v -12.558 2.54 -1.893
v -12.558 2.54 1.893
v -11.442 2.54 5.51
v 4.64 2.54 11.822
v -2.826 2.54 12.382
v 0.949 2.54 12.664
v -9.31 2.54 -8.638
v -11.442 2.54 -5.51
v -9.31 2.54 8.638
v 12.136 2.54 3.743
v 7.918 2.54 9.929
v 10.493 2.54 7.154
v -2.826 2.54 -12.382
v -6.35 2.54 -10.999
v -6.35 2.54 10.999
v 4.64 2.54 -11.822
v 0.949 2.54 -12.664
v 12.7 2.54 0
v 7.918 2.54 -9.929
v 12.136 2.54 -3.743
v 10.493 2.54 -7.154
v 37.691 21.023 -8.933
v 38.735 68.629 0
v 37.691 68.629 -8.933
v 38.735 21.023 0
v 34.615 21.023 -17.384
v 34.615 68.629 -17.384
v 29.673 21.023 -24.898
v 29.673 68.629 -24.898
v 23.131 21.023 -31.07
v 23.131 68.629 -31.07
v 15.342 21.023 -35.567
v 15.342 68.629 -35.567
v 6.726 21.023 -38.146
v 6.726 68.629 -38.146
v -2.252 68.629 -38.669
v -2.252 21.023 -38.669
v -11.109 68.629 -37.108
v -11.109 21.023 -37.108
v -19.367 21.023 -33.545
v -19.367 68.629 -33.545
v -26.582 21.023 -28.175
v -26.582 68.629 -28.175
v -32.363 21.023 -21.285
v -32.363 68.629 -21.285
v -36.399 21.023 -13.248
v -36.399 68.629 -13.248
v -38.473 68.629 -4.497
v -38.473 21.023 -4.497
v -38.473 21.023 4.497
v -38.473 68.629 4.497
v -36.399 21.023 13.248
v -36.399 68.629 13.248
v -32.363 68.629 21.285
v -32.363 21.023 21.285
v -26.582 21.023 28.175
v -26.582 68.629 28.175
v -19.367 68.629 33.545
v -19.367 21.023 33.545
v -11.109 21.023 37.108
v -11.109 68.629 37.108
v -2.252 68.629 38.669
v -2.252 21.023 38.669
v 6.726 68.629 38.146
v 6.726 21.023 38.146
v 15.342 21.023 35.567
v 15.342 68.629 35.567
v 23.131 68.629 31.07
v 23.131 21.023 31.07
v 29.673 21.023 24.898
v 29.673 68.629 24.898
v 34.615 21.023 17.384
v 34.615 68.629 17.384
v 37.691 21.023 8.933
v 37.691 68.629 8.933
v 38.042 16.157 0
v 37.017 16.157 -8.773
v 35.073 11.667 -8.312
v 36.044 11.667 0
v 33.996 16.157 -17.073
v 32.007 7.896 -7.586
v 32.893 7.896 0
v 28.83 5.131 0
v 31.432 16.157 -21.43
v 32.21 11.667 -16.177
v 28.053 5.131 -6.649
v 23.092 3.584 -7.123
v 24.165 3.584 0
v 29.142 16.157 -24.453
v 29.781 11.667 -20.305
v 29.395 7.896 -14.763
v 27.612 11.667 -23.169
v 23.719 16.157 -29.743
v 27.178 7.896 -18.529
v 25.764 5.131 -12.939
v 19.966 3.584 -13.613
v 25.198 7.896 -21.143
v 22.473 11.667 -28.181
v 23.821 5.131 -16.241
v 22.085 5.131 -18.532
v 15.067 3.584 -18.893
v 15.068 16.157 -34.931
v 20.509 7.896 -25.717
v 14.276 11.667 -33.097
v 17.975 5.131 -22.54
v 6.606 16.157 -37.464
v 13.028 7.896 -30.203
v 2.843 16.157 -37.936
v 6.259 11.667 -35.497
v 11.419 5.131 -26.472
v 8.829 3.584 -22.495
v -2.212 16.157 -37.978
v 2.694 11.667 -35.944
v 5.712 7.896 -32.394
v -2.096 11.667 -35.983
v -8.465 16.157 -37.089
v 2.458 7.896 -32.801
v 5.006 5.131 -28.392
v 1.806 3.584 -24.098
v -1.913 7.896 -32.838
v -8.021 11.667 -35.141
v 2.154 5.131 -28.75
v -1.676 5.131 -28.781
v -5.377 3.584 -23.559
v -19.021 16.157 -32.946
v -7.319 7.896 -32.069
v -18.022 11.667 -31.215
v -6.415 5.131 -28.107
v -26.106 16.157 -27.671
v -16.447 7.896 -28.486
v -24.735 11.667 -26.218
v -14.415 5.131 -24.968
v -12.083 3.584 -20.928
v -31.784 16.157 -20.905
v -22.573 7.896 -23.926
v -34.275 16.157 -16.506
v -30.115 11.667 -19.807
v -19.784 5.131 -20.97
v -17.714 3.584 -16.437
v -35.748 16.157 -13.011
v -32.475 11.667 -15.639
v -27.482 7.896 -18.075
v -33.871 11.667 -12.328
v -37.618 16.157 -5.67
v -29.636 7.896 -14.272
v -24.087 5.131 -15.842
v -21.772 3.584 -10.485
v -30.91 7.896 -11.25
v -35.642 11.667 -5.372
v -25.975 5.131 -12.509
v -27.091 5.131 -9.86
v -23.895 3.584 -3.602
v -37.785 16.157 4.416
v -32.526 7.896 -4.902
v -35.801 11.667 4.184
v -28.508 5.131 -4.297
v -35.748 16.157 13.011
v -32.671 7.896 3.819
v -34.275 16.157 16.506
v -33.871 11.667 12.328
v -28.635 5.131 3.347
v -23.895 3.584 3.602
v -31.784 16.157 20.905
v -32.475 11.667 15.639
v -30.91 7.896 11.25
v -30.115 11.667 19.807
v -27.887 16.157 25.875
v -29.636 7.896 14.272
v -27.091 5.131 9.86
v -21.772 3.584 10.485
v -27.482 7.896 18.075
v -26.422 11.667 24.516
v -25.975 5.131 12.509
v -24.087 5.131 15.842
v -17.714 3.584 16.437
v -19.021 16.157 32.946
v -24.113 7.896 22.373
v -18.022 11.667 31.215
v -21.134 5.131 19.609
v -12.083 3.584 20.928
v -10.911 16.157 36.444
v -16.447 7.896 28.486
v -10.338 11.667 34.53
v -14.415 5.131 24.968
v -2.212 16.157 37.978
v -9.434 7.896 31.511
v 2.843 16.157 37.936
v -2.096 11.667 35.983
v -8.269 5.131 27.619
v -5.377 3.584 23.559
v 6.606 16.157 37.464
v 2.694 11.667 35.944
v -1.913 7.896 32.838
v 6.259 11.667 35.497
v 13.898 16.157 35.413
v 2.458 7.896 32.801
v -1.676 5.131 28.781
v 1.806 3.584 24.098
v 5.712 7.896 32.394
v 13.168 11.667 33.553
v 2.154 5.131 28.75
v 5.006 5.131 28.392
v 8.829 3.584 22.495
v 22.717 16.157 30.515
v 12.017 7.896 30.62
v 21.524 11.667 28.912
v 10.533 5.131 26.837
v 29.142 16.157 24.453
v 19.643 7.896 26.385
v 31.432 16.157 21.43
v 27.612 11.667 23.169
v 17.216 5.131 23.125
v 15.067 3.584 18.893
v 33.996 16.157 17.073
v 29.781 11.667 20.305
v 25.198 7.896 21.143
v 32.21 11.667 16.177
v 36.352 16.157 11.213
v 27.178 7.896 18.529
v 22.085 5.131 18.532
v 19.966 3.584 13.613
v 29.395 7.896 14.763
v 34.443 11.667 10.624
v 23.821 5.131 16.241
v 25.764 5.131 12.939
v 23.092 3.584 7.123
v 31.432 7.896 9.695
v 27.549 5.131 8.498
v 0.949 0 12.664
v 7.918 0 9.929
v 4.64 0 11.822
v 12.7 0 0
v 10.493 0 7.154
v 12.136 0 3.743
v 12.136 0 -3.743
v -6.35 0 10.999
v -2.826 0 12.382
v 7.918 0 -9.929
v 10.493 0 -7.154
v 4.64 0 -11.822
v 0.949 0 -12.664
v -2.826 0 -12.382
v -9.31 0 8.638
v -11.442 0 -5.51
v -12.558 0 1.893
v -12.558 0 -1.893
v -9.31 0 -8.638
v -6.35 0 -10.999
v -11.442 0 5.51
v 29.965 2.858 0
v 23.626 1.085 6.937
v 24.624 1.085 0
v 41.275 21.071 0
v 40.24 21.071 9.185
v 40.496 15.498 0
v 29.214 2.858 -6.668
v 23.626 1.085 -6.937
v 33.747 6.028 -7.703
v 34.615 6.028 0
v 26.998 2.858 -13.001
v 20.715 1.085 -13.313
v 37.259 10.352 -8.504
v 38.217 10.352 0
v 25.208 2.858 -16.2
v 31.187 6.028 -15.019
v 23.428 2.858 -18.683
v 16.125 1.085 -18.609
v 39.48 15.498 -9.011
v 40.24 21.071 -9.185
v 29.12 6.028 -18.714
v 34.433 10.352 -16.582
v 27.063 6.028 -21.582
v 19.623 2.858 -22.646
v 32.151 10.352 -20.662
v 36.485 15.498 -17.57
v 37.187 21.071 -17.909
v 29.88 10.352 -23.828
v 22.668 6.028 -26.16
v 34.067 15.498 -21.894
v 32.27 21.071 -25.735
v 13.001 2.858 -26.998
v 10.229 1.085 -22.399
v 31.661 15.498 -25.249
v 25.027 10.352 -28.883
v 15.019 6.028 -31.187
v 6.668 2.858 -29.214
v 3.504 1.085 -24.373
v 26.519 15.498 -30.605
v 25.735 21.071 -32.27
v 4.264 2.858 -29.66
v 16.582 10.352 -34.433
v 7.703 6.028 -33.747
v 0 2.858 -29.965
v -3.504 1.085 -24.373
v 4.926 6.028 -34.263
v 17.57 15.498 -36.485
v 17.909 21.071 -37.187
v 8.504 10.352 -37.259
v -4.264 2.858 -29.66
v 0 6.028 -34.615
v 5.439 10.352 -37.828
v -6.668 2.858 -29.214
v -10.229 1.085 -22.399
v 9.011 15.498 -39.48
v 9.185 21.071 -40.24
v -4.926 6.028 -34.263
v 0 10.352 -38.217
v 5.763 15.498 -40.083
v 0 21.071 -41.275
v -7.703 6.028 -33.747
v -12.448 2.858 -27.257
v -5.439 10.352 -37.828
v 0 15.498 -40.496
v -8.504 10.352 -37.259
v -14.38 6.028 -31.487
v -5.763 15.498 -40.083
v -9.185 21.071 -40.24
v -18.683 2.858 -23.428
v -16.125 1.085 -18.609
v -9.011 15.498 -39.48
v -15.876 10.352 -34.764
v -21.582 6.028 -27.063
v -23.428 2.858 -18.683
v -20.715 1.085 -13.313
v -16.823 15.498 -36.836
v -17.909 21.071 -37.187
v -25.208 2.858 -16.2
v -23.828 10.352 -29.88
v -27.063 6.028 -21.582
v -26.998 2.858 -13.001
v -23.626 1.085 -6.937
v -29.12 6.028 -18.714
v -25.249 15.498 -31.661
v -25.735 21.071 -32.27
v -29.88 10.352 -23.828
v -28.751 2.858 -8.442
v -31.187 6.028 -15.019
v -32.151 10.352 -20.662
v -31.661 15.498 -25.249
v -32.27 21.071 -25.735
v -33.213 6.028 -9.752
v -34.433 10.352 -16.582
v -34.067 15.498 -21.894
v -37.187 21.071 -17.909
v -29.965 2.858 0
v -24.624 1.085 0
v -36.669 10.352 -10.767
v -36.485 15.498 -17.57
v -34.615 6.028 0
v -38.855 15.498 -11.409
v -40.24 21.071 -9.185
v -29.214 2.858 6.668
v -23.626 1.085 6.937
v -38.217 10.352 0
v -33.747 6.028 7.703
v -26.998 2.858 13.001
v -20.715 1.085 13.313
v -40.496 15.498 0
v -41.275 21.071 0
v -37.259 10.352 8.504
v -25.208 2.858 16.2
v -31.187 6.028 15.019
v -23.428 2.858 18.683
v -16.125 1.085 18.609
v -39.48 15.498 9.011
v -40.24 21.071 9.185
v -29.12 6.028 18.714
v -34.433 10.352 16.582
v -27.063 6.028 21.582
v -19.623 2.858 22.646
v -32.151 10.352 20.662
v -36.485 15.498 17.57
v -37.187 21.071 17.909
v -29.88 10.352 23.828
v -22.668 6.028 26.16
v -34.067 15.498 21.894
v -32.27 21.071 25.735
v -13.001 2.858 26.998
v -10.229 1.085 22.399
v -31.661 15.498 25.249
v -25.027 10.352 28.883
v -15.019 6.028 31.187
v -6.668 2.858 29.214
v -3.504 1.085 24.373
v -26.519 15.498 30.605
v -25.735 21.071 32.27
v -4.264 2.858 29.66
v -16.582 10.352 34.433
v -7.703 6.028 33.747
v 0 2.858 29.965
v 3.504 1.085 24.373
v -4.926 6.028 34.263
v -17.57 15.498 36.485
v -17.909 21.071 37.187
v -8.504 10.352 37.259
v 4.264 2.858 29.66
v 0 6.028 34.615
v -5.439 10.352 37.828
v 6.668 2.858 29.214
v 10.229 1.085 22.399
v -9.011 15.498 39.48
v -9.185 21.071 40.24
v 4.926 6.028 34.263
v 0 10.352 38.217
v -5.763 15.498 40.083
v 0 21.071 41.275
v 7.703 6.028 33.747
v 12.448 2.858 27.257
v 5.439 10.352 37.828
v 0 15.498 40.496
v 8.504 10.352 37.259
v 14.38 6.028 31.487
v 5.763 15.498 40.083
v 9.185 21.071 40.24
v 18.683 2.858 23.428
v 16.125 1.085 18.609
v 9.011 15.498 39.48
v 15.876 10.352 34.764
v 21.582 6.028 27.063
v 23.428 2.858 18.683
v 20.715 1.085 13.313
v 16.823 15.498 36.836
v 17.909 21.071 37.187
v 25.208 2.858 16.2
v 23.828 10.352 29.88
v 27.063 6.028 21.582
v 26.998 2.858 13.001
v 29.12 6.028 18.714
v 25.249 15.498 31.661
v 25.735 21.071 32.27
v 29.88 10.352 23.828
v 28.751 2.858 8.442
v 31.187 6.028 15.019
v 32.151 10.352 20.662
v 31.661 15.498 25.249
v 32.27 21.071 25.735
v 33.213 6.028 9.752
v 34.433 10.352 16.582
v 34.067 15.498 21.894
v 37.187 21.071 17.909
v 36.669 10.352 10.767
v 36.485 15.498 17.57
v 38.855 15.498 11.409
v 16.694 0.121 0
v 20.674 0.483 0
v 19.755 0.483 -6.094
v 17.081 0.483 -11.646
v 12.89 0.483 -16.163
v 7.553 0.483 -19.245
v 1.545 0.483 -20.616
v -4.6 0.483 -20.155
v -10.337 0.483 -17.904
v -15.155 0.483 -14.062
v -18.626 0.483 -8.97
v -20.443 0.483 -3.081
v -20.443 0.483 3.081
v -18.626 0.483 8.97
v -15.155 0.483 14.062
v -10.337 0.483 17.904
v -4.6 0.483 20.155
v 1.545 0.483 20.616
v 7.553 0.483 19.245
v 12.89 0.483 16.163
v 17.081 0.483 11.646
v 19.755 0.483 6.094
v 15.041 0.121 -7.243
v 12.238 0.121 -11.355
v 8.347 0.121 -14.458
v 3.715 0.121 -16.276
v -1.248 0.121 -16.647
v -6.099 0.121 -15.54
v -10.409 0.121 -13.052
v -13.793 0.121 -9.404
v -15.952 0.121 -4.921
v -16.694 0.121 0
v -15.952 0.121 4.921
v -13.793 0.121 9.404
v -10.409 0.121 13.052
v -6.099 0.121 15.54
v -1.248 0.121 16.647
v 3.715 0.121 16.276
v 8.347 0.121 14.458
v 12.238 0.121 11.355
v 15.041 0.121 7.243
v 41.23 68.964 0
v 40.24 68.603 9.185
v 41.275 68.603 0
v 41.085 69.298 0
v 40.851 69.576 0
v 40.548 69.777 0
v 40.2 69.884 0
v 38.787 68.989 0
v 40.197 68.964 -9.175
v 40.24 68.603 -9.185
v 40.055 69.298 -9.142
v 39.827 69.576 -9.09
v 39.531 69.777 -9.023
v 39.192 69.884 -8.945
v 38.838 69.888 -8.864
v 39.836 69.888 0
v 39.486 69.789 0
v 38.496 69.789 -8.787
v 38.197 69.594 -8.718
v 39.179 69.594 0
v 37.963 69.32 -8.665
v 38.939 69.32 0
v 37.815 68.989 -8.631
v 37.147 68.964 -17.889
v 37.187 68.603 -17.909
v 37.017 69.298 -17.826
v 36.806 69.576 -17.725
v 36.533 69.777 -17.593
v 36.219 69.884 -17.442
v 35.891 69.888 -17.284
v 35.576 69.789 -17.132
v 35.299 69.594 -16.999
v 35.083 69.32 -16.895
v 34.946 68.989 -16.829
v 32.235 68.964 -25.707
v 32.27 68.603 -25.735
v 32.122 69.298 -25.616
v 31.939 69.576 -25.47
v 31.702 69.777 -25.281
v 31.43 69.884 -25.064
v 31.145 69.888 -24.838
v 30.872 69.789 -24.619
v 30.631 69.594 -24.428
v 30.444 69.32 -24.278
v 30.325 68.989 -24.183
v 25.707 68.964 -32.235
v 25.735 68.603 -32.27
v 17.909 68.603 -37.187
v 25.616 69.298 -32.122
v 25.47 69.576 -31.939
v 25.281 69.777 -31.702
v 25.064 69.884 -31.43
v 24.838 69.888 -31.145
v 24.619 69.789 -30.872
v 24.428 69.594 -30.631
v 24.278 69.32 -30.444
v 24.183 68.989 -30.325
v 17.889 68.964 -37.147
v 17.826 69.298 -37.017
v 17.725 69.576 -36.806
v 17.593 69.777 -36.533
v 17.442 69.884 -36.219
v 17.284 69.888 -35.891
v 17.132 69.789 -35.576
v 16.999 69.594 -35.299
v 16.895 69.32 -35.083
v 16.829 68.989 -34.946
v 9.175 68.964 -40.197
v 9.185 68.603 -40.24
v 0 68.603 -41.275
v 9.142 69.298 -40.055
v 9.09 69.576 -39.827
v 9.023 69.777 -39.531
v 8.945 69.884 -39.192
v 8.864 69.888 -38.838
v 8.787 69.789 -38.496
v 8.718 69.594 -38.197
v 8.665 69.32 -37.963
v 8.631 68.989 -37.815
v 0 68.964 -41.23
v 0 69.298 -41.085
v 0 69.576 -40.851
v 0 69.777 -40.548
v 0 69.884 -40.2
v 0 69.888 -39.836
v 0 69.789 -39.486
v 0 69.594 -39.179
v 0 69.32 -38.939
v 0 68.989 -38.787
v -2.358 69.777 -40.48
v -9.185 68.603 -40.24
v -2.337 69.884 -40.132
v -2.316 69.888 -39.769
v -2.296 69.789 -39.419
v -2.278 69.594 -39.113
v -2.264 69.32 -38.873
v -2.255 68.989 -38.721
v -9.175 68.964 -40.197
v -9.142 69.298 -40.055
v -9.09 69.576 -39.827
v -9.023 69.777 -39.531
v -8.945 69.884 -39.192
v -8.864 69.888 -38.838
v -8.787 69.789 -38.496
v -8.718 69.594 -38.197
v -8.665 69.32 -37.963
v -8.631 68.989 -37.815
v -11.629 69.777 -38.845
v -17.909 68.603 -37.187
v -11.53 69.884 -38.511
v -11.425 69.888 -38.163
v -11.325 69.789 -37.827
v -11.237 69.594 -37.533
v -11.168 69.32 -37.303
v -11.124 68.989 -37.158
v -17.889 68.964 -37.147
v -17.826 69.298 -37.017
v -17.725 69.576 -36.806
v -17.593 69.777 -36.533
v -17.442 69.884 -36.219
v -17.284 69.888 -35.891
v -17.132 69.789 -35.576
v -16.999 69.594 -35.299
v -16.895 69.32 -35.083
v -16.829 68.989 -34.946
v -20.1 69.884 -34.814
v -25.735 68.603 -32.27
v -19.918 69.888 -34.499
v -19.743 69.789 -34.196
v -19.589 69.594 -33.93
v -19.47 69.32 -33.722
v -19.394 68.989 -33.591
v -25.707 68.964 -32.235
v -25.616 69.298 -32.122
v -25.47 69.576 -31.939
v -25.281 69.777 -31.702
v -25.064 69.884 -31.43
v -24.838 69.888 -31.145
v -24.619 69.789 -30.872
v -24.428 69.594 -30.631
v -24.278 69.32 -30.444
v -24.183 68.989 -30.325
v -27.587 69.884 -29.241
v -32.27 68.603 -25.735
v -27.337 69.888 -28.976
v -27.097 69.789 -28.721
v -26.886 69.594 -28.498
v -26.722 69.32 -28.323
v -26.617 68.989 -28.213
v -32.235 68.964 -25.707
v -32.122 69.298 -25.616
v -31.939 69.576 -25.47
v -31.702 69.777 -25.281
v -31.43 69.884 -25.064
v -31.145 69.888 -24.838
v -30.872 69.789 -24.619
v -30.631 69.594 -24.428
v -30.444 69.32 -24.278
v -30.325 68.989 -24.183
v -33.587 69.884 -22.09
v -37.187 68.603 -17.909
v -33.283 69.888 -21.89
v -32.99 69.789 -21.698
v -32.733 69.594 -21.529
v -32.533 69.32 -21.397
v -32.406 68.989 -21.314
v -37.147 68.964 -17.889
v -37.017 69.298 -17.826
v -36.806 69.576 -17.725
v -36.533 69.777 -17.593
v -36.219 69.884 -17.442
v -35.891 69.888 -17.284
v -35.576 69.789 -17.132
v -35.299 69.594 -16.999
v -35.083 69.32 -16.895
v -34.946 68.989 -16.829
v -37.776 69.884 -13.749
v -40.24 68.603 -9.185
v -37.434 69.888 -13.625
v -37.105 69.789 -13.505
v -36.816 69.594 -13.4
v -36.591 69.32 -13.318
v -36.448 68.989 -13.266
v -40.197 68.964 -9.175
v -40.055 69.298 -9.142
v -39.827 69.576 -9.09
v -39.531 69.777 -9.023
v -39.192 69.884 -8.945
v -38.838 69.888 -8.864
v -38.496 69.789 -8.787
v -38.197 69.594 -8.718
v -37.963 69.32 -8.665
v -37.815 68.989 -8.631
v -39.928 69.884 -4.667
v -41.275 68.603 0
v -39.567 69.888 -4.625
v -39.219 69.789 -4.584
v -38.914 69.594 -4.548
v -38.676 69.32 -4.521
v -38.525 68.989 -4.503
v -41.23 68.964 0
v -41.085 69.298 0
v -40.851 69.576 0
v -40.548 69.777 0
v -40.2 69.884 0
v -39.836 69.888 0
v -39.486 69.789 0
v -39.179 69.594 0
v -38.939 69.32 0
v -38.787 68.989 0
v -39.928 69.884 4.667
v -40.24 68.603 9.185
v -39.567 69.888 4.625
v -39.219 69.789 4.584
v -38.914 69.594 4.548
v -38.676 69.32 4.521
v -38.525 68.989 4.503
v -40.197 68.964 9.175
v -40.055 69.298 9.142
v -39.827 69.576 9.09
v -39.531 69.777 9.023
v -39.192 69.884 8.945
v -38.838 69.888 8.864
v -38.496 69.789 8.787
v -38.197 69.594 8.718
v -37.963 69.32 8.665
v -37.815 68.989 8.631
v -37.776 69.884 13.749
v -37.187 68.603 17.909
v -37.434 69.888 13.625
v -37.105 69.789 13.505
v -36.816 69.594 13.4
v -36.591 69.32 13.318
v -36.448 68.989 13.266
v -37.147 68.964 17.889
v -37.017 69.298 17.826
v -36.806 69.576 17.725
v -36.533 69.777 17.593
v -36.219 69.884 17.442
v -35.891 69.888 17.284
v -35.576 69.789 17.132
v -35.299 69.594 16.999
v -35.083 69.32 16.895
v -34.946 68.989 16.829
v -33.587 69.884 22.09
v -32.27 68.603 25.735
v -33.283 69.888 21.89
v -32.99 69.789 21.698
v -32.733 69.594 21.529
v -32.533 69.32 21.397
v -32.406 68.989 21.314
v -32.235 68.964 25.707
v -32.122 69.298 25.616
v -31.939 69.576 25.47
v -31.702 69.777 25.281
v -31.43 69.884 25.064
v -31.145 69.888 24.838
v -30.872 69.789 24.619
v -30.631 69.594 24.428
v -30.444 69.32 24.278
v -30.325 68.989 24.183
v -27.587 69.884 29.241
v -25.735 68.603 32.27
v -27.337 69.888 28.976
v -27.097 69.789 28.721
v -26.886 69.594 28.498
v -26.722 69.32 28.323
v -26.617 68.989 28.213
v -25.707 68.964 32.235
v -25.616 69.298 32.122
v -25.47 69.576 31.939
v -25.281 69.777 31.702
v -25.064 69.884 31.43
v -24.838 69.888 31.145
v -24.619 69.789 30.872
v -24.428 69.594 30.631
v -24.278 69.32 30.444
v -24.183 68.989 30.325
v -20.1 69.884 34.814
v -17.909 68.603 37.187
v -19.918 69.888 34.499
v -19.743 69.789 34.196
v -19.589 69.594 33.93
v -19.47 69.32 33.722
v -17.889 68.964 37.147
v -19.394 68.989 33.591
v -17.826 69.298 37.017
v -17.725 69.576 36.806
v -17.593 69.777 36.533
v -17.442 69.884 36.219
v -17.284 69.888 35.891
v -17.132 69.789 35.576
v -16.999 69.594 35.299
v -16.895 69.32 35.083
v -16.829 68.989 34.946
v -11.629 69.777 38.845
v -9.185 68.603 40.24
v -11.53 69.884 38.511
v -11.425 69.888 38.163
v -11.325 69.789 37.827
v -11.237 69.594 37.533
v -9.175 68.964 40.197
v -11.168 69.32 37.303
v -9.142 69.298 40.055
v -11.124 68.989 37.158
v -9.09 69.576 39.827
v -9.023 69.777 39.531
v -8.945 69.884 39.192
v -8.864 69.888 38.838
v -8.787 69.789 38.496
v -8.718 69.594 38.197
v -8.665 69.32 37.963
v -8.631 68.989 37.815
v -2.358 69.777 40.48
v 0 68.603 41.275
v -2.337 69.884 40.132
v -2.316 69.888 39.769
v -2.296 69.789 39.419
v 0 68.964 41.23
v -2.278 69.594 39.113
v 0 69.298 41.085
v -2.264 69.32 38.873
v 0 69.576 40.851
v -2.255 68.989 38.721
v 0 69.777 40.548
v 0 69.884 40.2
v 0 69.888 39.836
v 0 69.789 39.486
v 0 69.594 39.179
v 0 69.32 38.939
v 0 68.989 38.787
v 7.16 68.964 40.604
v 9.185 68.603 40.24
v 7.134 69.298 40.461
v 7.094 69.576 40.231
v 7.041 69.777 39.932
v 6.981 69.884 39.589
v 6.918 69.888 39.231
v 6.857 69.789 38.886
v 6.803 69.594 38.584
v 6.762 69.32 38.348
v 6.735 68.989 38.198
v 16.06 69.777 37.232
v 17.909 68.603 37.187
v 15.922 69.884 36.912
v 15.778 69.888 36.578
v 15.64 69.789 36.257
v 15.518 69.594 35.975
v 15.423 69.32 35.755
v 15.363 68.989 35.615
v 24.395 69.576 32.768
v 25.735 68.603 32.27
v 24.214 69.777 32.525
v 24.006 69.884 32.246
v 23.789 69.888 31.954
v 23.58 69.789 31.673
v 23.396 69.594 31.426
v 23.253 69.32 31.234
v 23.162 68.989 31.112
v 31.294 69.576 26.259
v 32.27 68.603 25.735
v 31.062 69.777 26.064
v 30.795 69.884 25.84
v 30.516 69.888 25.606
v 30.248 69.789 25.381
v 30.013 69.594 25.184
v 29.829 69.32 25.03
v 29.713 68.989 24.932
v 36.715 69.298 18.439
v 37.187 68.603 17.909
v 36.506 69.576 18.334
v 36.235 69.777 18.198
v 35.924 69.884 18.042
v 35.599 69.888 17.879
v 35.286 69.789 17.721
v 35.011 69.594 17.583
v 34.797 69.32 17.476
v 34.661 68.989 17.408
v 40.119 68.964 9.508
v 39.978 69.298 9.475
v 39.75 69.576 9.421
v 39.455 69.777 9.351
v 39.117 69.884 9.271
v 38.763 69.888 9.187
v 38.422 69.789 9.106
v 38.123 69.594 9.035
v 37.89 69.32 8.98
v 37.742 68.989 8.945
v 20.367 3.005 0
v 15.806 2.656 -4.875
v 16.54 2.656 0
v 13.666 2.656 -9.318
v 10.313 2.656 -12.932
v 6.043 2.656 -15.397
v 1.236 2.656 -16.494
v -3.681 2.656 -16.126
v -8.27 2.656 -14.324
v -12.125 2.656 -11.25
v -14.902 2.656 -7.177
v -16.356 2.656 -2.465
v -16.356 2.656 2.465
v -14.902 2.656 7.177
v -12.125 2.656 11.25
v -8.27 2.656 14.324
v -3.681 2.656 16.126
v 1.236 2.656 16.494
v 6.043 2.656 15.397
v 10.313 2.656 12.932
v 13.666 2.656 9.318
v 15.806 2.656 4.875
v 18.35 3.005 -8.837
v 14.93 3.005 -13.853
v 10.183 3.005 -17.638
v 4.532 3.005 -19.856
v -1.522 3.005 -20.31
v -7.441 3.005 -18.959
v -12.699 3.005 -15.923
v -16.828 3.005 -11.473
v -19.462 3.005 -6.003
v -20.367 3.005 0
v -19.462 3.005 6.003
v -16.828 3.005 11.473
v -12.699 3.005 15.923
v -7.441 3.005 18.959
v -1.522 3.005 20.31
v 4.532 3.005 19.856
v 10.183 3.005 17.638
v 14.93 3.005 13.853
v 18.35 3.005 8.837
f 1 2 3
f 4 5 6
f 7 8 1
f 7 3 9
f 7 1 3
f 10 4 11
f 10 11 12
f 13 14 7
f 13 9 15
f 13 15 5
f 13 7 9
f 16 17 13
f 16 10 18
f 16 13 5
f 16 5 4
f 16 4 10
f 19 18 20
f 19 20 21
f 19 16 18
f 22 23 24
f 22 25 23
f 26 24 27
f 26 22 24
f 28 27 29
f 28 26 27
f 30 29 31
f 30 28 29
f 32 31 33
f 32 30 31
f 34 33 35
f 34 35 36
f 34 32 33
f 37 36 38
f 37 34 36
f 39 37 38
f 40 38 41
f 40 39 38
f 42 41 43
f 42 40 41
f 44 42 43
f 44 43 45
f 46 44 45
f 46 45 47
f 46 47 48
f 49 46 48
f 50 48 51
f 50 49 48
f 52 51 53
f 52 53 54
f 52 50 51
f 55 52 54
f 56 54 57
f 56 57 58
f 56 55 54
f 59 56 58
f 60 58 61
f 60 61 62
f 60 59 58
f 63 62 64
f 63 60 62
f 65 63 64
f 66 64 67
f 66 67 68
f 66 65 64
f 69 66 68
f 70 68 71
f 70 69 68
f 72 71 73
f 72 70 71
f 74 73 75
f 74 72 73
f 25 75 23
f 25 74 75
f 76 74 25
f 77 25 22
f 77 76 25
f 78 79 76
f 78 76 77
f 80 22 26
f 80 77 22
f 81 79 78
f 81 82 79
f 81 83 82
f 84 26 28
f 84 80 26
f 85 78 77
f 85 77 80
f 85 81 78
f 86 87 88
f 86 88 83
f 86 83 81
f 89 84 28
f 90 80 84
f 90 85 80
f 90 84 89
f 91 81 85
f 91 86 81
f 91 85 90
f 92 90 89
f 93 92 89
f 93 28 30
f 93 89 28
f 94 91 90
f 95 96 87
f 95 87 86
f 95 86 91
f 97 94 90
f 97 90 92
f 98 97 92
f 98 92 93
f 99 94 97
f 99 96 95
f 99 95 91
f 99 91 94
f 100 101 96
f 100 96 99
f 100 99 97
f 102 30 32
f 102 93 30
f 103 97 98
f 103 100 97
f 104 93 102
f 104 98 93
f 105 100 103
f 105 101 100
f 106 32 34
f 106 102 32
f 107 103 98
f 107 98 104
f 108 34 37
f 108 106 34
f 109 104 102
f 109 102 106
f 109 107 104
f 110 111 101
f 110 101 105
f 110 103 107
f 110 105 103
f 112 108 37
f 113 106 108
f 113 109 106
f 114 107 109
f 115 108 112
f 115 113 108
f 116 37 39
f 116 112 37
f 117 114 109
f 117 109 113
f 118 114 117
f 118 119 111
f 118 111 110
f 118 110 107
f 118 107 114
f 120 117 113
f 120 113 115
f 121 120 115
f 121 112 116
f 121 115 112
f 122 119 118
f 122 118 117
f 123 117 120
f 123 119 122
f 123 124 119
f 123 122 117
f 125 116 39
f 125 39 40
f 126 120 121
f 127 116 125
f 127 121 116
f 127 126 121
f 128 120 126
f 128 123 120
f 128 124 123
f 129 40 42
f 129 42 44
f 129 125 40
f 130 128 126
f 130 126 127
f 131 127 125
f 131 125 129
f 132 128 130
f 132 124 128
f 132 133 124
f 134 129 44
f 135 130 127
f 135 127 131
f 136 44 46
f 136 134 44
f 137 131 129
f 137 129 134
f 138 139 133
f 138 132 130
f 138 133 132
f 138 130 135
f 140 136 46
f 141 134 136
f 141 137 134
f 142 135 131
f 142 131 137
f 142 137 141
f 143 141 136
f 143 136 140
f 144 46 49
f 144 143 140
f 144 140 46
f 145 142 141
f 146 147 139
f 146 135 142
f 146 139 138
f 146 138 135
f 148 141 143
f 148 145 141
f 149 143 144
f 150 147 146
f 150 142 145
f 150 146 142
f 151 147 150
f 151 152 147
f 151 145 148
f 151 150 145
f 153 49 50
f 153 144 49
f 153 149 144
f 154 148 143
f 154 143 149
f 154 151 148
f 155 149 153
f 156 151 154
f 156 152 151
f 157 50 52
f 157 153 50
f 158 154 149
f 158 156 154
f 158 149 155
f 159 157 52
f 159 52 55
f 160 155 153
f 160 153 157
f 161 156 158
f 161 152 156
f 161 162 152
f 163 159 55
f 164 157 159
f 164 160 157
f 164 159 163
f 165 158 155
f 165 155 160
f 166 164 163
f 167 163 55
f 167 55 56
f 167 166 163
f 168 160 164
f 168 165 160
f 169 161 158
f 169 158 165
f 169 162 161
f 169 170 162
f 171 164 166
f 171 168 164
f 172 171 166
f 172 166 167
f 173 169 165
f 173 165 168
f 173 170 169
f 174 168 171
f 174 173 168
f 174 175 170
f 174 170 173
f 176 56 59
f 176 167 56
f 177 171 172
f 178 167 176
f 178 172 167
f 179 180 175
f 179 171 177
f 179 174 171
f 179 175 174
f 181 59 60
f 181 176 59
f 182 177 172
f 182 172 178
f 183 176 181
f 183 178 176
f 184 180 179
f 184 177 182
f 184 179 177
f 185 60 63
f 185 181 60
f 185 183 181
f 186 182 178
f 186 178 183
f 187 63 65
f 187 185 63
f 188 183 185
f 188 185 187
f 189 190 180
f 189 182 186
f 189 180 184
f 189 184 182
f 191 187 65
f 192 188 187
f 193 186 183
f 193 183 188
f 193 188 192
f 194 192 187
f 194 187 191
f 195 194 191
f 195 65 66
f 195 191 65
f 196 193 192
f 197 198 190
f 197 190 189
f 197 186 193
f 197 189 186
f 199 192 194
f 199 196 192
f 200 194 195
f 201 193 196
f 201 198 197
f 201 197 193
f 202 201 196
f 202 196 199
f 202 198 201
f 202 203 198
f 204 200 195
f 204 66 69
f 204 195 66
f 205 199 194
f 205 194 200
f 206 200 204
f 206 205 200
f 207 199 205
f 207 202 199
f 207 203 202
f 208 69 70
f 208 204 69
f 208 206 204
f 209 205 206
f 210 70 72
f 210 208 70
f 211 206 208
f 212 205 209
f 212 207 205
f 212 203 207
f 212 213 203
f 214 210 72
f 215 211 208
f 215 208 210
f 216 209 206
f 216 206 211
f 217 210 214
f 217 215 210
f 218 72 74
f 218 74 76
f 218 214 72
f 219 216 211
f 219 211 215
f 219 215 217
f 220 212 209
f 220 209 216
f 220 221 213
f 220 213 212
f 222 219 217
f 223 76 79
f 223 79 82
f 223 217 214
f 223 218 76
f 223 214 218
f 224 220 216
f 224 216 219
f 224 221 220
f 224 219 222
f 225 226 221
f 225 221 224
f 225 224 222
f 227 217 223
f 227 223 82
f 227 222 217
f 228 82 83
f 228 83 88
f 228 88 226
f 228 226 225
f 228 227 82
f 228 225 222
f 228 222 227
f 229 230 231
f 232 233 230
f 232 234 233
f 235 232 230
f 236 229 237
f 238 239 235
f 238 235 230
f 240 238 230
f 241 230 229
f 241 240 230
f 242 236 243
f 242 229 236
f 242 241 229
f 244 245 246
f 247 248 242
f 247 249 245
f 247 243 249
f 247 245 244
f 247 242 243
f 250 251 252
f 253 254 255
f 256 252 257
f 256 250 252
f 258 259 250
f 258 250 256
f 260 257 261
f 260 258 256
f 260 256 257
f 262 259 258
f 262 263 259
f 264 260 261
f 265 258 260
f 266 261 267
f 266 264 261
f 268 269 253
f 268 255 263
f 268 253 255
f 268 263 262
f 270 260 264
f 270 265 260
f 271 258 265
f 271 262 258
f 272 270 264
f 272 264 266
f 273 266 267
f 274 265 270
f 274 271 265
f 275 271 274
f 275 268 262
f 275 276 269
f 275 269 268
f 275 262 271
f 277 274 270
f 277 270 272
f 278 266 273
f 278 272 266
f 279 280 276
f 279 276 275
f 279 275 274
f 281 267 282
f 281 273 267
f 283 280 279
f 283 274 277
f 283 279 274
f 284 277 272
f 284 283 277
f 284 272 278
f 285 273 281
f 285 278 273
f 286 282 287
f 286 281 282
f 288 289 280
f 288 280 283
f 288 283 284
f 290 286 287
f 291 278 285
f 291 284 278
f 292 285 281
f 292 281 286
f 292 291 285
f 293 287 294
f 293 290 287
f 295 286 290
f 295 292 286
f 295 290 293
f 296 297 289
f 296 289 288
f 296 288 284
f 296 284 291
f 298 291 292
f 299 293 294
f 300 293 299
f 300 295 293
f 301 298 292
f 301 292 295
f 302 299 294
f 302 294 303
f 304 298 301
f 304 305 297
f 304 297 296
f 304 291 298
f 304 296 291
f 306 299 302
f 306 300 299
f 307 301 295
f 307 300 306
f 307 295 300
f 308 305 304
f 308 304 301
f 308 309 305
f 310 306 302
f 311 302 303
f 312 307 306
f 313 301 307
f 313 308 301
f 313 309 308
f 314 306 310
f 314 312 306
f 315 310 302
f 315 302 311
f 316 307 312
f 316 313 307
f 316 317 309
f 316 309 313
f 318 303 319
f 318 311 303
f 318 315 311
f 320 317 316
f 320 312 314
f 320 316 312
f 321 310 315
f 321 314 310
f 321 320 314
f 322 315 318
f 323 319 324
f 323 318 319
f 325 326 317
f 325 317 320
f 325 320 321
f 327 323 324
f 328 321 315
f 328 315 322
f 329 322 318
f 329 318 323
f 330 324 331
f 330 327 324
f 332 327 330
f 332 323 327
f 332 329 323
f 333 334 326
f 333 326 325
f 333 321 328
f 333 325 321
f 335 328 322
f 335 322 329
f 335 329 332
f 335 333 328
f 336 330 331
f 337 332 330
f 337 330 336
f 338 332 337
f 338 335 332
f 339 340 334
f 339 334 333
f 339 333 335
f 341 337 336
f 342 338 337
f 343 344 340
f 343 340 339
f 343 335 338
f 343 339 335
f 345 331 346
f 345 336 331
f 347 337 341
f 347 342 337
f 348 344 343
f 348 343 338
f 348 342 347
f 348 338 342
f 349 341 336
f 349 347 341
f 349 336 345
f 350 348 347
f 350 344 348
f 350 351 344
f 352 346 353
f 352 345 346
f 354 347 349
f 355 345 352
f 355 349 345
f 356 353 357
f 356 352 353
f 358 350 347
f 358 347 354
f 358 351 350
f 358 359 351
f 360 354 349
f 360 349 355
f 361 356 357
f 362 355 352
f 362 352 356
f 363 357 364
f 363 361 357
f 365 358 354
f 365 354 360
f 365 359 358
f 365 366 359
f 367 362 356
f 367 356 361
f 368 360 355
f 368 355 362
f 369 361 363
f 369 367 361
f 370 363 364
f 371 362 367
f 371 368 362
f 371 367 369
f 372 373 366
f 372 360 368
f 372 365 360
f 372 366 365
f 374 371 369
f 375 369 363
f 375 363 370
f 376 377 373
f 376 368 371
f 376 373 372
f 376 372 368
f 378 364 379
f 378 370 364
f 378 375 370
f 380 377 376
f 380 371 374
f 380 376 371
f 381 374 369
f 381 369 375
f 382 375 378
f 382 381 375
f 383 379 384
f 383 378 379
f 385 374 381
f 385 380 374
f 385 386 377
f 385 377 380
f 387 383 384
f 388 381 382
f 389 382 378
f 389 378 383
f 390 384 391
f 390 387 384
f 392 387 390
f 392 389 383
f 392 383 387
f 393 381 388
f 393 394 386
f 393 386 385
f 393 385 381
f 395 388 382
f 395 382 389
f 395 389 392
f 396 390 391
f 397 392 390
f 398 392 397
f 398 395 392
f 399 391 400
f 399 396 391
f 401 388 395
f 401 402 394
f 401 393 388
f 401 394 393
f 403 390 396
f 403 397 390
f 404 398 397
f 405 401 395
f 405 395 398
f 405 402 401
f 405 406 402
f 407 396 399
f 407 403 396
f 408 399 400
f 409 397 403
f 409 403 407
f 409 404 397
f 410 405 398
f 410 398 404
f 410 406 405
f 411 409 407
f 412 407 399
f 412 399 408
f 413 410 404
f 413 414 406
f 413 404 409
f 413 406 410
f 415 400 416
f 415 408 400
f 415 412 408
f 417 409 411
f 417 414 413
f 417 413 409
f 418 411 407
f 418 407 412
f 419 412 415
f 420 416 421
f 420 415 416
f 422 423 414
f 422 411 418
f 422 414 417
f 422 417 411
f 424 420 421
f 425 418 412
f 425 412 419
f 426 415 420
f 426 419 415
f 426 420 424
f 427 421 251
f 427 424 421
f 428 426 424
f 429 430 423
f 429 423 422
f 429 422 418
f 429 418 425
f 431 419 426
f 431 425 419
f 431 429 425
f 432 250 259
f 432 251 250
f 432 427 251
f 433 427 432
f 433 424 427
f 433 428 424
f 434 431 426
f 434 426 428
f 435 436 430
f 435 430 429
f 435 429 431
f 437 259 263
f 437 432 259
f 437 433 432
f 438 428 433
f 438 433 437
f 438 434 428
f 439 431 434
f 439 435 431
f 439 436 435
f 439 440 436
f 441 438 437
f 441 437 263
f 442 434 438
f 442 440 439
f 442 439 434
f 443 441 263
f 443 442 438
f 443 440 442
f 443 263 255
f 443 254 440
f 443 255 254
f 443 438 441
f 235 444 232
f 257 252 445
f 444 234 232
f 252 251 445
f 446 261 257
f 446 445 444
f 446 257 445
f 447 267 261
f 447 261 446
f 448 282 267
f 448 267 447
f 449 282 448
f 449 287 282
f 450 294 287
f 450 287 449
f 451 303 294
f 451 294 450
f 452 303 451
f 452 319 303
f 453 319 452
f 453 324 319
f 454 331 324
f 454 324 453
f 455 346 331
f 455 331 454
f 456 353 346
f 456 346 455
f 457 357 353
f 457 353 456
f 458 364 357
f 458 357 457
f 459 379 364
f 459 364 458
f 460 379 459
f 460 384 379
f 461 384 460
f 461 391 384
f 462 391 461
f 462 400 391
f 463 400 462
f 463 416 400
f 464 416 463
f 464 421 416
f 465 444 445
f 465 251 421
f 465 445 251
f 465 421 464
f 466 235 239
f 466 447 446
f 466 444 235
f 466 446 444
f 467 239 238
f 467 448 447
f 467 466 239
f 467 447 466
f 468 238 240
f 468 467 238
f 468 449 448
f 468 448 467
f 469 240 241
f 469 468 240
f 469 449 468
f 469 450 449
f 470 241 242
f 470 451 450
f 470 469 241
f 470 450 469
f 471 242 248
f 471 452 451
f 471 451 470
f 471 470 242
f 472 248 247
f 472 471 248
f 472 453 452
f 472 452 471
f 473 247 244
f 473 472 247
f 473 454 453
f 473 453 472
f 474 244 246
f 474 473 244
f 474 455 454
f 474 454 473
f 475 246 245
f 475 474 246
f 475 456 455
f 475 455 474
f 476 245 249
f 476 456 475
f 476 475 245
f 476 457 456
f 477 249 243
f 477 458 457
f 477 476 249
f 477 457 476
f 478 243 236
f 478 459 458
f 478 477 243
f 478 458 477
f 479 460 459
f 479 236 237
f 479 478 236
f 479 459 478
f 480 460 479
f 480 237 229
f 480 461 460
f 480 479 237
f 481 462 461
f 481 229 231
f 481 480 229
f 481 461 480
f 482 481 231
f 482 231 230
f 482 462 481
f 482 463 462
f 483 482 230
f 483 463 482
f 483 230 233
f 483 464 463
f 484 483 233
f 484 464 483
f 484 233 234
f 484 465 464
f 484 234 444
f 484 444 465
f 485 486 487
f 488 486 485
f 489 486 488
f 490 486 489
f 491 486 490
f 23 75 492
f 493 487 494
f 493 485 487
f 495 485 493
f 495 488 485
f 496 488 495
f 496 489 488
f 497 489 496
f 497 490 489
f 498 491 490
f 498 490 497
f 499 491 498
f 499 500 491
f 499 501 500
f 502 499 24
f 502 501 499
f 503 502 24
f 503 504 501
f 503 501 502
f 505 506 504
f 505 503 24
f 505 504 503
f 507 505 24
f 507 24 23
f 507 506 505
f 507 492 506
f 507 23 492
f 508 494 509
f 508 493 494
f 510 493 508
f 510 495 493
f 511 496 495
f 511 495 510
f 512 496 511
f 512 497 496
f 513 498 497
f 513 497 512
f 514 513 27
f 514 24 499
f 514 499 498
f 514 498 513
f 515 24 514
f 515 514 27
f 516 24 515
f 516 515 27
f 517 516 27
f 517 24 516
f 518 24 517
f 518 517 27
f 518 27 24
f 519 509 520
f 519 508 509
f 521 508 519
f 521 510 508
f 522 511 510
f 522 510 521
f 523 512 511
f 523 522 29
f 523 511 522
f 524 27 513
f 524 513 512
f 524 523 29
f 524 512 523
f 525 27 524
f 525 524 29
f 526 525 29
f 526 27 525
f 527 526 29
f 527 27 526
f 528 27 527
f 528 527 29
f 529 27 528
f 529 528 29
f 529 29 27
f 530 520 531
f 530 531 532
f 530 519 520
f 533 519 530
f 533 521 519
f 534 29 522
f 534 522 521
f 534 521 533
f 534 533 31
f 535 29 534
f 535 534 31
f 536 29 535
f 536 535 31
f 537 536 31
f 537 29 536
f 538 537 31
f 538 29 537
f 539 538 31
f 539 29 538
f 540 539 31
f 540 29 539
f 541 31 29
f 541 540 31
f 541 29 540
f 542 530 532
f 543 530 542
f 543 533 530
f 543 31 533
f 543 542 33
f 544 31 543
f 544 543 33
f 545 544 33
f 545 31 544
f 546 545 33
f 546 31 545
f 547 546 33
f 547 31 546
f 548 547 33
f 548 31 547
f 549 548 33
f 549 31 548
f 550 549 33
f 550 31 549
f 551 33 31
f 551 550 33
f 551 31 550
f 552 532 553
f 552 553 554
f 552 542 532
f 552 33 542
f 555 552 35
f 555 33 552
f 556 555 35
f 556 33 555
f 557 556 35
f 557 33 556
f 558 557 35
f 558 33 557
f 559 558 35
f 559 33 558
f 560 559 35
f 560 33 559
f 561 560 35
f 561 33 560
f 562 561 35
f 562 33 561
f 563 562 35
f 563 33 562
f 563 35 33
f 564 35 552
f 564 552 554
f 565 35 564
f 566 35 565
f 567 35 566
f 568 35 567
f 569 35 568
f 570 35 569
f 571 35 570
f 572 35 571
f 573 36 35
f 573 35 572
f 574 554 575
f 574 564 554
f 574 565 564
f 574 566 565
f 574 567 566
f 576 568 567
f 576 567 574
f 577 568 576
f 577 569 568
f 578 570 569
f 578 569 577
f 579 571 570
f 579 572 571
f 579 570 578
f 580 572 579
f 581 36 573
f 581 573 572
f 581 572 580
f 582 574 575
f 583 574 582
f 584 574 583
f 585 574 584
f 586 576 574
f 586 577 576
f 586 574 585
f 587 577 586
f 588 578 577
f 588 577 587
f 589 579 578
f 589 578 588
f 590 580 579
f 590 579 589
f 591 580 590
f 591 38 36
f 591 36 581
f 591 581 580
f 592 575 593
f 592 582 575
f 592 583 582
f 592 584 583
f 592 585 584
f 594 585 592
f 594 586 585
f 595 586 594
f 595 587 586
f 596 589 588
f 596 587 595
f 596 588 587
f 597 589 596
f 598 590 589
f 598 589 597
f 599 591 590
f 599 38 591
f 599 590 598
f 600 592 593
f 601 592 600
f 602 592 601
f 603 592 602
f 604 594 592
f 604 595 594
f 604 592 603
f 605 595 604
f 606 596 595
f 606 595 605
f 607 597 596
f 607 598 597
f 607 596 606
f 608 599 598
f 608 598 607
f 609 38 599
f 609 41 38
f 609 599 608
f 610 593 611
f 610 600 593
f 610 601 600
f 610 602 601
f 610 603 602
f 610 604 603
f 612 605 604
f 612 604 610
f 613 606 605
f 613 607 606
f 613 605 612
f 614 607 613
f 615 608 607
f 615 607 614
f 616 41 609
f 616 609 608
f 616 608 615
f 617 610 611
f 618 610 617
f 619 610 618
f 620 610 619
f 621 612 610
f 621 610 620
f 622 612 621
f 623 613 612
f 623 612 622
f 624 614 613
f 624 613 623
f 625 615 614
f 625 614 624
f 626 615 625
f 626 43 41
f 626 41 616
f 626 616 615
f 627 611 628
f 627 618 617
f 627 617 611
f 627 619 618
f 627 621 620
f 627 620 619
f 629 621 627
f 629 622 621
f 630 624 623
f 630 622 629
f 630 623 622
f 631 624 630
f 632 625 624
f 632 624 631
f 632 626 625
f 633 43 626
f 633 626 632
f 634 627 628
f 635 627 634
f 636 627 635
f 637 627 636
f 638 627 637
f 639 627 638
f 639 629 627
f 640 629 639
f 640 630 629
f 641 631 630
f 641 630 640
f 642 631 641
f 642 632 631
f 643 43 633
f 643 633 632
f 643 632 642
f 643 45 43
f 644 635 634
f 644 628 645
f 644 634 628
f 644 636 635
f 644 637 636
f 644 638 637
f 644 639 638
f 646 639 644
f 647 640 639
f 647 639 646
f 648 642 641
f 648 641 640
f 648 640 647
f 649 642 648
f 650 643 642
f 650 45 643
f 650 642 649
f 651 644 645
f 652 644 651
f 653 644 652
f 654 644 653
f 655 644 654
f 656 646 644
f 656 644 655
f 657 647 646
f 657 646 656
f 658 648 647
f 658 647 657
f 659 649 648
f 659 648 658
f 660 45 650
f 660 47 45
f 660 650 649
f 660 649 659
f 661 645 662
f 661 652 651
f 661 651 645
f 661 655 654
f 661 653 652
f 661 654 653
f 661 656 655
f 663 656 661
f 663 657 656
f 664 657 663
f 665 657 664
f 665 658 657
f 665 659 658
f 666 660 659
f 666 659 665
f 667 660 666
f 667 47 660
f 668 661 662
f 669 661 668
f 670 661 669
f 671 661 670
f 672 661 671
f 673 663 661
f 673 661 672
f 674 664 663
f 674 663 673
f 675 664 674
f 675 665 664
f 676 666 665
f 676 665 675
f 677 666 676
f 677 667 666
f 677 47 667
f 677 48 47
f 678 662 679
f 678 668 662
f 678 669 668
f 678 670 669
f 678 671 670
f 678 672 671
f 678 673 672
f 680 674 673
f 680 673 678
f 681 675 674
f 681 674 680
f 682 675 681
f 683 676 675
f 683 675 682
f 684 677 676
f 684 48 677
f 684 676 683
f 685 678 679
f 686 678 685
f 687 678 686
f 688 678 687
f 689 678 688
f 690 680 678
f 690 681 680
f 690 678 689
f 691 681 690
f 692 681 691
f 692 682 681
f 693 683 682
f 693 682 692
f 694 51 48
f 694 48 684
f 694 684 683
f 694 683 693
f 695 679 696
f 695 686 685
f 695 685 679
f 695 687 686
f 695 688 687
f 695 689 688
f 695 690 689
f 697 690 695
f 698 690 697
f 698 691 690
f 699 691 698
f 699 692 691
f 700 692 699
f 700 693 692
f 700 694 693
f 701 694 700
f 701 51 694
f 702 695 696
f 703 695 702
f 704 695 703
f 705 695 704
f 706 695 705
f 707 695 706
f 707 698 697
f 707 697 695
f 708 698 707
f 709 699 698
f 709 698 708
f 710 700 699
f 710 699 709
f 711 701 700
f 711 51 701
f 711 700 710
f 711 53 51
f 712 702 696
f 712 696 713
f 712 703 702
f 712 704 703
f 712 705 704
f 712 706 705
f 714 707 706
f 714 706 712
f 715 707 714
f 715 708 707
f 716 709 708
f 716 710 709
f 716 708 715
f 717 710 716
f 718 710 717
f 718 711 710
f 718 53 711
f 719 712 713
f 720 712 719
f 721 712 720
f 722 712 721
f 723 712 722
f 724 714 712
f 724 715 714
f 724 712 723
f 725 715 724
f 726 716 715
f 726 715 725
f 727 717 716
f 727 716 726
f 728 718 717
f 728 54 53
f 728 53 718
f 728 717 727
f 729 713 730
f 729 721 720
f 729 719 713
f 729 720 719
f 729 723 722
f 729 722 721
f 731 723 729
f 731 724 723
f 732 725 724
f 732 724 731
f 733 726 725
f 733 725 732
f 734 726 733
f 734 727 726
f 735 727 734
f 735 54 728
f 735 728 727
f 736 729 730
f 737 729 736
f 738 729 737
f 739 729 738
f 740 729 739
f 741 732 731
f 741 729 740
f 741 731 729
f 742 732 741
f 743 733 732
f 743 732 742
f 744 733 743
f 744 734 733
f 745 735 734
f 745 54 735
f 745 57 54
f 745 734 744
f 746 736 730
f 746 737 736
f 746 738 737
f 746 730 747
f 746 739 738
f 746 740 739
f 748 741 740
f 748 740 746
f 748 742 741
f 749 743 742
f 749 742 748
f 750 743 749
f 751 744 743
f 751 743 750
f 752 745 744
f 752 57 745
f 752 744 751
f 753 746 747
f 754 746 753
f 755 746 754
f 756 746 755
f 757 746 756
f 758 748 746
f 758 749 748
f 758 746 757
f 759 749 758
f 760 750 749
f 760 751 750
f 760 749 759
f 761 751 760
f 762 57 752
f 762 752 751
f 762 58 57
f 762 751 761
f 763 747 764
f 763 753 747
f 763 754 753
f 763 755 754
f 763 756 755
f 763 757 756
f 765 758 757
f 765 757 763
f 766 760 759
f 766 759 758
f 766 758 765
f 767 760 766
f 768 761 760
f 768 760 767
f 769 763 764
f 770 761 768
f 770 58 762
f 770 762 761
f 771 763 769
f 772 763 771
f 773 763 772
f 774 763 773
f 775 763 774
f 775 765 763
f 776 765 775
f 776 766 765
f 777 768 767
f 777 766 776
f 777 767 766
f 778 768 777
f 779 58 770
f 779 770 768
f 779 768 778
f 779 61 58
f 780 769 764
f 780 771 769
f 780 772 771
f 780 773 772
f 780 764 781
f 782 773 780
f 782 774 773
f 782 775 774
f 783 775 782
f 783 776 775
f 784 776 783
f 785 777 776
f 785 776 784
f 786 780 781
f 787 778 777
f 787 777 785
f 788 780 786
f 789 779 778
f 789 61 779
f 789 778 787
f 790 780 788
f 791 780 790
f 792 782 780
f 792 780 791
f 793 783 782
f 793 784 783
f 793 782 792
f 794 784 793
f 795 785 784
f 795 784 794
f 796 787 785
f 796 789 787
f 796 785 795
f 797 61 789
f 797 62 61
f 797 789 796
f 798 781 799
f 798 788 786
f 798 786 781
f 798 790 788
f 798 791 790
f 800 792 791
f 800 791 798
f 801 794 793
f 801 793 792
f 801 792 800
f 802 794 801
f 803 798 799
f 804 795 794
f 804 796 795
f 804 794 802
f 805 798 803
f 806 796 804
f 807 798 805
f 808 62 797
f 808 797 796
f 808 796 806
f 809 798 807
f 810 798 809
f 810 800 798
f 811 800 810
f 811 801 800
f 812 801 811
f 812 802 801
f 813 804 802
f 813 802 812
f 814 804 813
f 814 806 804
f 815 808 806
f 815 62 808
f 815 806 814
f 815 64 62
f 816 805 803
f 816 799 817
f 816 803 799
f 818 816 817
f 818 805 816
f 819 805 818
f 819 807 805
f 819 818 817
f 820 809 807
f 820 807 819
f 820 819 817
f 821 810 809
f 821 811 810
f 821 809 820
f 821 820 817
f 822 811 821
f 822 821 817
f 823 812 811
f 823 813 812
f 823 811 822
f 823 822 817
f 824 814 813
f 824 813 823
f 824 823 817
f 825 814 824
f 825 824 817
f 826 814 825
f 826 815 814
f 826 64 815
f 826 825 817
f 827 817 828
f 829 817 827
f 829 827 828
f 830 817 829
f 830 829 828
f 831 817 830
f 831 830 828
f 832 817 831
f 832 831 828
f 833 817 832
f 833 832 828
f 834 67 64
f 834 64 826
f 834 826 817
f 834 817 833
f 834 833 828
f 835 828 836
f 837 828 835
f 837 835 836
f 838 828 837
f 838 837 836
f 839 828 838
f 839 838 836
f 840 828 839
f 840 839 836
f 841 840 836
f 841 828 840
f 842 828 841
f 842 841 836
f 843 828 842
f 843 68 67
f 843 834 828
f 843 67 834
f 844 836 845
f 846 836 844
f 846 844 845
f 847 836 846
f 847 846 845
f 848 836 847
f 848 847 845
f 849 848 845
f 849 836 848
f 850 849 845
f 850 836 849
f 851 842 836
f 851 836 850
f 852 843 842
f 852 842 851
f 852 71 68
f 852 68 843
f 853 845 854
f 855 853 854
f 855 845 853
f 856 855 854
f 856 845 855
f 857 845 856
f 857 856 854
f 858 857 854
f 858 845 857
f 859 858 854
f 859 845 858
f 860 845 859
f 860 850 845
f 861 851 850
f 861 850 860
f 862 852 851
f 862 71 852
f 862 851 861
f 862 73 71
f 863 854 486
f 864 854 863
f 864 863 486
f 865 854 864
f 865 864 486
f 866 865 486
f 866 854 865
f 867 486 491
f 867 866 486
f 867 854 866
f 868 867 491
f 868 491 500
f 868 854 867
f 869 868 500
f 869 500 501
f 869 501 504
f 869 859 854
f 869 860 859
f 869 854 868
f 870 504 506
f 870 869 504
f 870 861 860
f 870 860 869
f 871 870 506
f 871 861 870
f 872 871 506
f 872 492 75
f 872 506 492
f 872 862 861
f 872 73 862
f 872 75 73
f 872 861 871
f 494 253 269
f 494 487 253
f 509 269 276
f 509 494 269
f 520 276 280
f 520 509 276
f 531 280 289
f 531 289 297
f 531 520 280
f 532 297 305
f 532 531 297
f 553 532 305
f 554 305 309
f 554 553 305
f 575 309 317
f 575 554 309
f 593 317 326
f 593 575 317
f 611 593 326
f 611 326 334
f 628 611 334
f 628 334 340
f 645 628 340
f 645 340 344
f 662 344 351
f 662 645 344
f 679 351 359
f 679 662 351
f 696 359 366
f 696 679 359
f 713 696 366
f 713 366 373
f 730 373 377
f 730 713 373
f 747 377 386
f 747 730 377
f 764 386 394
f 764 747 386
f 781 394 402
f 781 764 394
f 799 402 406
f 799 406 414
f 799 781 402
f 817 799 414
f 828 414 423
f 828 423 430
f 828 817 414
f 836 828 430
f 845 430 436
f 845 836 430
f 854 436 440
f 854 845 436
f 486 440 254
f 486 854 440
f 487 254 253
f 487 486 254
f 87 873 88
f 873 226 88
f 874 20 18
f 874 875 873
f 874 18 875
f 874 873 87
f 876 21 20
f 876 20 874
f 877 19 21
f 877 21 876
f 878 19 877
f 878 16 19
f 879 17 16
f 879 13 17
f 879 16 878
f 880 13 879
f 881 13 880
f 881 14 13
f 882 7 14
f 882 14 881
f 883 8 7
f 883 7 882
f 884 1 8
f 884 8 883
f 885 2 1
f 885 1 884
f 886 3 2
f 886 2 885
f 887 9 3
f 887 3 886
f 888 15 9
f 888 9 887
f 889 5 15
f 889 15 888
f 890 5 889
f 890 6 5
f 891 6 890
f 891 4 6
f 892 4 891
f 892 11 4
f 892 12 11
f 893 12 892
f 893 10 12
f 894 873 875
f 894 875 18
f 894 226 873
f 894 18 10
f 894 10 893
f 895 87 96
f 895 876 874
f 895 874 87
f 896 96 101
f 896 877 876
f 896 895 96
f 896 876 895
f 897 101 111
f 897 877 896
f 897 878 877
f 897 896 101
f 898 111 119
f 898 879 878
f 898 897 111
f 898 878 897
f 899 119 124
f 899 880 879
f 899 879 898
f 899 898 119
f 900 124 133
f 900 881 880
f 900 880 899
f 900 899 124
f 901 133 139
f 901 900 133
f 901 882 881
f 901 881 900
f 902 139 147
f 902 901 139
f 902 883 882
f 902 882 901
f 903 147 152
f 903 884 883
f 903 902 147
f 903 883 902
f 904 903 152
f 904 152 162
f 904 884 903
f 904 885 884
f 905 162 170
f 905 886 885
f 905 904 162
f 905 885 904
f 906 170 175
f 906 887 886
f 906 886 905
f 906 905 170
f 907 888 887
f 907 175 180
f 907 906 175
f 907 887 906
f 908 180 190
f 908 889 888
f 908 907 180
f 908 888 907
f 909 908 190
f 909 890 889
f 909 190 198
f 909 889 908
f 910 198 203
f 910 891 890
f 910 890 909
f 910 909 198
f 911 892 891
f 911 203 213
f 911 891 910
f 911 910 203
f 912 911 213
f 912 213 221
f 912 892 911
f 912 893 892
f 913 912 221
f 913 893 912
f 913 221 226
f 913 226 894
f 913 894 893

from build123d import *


with BuildPart() as part:
    # Sketch1 → Revolve1 (revolve)
    with BuildSketch(Plane.XY):
        with BuildLine():
            Line((0, 0), (12.7, 0))
            ThreePointArc((12.7, 0), (18.686592918, 0.271905112), (24.623888889, 1.085381429))
            ThreePointArc((24.623888889, 1.085381429), (36.566761948, 8.064677779), (41.275, 21.071417912))
            Line((41.275, 21.071417912), (41.275, 68.602618404))
            ThreePointArc((41.275, 68.602618404), (40.018407707, 69.89932214), (38.734934185, 68.629219589))
            Line((38.734934185, 68.629219589), (38.734934185, 21.023040538))
            ThreePointArc((38.734934185, 21.023040538), (34.599795979, 9.671946754), (24.165277778, 3.583635989))
            ThreePointArc((24.165277778, 3.583635989), (18.456339345, 2.801447223), (12.7, 2.54))
            Line((12.7, 2.54), (0, 2.54))
            Line((0, 2.54), (0, 0))
        make_face()
    revolve(axis=Axis((0, 0, 0), (0, 1, 0)))


solid = part.part
